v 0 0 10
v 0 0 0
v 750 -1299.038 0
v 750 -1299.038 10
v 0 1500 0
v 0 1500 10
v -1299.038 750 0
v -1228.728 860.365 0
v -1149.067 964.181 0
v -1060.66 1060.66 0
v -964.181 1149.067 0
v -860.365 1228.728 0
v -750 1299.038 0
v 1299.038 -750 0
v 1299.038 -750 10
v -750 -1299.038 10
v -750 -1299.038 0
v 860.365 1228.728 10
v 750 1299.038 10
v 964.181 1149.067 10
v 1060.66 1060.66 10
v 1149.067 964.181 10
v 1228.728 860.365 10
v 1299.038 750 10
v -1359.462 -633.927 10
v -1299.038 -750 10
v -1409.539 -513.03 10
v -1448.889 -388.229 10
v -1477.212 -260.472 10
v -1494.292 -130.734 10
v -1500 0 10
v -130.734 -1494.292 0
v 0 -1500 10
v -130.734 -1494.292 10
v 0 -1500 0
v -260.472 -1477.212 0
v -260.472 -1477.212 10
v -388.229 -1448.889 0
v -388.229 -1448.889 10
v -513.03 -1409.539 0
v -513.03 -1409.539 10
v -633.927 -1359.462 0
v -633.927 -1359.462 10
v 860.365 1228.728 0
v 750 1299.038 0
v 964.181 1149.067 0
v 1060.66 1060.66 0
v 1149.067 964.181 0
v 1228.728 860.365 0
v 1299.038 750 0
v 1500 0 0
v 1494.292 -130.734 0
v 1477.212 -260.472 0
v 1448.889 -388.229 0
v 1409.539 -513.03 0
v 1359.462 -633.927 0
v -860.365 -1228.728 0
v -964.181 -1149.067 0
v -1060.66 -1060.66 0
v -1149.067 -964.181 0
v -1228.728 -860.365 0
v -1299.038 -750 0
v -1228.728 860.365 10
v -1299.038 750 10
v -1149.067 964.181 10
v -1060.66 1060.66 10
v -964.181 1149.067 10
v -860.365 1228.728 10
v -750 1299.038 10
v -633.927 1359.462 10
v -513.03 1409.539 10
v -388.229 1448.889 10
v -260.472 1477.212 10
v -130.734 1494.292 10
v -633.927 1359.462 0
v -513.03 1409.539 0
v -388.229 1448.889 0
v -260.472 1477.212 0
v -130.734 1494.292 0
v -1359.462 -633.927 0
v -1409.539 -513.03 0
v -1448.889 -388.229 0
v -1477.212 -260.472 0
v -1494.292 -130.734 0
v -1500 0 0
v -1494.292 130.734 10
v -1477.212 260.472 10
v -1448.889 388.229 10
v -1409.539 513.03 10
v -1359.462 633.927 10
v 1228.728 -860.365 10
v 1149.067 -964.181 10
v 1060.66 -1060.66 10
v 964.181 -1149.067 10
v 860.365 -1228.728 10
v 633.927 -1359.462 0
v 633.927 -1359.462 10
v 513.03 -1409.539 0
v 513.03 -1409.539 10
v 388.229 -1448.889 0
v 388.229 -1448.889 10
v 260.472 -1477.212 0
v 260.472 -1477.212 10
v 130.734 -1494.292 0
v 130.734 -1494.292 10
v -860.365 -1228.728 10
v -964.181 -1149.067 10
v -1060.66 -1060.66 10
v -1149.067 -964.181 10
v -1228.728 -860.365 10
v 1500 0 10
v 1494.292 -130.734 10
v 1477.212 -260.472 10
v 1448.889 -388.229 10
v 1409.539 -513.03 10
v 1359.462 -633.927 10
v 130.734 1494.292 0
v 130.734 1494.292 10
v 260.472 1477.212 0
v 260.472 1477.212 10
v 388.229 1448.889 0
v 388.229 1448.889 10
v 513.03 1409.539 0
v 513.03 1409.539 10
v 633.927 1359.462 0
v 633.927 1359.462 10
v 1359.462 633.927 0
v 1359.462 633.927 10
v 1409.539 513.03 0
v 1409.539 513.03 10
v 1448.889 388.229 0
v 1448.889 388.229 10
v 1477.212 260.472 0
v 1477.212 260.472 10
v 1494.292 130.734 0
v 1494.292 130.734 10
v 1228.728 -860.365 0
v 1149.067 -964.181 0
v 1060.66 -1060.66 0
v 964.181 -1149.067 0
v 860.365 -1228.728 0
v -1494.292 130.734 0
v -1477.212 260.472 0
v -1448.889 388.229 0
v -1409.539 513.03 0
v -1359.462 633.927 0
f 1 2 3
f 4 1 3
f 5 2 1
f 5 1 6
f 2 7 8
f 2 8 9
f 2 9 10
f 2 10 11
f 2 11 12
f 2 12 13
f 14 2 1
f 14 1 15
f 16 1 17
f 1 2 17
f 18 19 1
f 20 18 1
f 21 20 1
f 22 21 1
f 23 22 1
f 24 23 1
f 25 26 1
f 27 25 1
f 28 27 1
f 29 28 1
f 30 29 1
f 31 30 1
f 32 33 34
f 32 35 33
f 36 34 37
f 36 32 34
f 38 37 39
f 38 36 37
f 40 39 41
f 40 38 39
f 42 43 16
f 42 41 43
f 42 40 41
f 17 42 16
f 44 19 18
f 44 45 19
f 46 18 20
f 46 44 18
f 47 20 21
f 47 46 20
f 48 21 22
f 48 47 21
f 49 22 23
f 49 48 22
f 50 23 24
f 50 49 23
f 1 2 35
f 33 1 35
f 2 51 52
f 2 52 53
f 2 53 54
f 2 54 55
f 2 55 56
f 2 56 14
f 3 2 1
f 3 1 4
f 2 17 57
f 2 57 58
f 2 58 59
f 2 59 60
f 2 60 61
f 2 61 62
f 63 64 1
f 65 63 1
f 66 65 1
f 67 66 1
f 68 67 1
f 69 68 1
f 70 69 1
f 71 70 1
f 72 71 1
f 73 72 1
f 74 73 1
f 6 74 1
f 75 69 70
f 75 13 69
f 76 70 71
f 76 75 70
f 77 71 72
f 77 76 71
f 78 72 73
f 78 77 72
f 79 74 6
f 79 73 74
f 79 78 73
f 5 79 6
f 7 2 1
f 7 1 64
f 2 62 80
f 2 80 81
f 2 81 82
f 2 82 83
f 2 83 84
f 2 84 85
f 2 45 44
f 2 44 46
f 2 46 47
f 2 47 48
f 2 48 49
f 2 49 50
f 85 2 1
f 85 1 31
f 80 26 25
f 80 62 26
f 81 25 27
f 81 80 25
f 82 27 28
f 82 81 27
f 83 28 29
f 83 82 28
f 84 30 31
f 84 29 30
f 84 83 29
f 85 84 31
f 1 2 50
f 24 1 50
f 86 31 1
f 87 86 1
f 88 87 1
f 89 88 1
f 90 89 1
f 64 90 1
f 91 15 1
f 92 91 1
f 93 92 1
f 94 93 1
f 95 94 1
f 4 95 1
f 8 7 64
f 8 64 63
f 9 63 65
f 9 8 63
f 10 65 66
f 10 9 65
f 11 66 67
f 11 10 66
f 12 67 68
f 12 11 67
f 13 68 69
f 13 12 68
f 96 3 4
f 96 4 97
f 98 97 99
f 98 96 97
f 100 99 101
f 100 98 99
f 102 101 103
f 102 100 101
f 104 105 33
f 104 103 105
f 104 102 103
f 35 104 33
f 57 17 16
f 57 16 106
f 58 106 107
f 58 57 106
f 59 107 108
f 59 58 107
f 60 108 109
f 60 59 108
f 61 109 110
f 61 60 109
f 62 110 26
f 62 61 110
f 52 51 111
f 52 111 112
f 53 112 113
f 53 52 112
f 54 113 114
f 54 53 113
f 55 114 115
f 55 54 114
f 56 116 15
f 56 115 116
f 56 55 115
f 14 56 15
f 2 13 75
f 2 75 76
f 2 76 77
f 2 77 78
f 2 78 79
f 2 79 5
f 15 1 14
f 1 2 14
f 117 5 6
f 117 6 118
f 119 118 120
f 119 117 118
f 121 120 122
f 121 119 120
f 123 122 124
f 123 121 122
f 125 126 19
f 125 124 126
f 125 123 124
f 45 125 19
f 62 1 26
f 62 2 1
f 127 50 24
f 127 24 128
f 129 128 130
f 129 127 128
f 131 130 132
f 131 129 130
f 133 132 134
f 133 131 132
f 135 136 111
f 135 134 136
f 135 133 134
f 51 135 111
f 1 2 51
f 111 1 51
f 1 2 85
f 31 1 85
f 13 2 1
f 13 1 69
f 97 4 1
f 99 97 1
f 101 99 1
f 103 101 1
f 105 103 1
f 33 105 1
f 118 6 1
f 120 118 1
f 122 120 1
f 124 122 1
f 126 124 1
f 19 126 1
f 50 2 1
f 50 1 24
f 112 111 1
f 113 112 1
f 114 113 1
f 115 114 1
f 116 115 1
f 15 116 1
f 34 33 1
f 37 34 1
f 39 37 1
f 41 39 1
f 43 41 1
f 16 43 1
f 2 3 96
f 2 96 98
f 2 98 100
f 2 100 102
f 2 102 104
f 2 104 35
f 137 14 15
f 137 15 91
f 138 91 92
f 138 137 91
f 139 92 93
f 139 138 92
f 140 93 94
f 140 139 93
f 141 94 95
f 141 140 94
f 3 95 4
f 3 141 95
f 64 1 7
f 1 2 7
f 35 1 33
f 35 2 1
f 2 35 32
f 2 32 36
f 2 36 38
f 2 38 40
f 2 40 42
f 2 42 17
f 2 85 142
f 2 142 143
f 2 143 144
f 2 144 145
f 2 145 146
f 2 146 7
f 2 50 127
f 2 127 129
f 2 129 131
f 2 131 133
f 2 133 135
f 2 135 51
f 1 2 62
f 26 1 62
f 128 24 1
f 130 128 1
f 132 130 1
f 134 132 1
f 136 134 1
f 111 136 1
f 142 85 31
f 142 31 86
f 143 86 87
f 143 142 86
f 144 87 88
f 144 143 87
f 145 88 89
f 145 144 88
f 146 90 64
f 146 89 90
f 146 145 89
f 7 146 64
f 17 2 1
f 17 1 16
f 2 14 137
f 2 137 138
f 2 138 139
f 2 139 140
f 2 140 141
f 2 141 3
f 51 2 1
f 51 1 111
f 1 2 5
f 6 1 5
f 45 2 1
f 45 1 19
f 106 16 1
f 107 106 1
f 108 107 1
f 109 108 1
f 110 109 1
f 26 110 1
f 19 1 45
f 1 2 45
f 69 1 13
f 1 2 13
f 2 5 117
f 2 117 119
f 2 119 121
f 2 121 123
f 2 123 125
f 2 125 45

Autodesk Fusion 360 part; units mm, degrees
sketch "Schizzo1" plane through (0, 0, 0) normal (0, 0, 1) x (1, 0, 0)
  circle A0 centre (0, 0) radius 1500
  line L0 (0, 0) -> (0, 1500)
  line L1 (0, 0) -> (-750, 1299.0381)
  line L2 (0, 0) -> (-1299.0381, 750)
  line L3 (0, 0) -> (-1500, 0)
  line L4 (0, 0) -> (-1299.0381, -750)
  line L5 (0, 0) -> (-750, -1299.0381)
  line L6 (0, 0) -> (0, -1500)
  line L7 (0, 0) -> (750, -1299.0381)
  line L8 (0, 0) -> (1299.0381, -750)
  line L9 (0, 0) -> (1500, 0)
  line L10 (0, 0) -> (1299.0381, 750)
  line L11 (0, 0) -> (750, 1299.0381)
  dimension "d1" = 3000
  dimension "d3" = 360
extrude "Estrusione1" add sketch "Schizzo1" along normal blind 10 contours A0 L0 L11 makes body 1
pattern_circular "Serie C1" count 12 over 360 about axis through (0, 0, 1.75) along (0, 0, 1) of bodies 1 makes body 2 at (-441.3417, 894.9525, 0) makes body 3 at (-829.6894, 554.3807, 0) makes body 4 at (-995.7224, 65.2631, 0) makes body 5 at (-894.9525, -441.3417, 0) makes body 6 at (-554.3807, -829.6894, 0) makes body 7 at (-65.2631, -995.7224, 0) makes body 8 at (441.3417, -894.9525, 0) makes body 9 at (829.6894, -554.3807, 0) makes body 10 at (995.7224, -65.2631, 0) makes body 11 at (894.9525, 441.3417, 0) makes body 12 at (554.3807, 829.6894, 0)
sketch "Schizzo2" plane through (0, 0, 10) normal (0, 0, 1) x (-1, 0, 0)
  line L0 (0, 0) -> (0, -1500)
  arc A0 (0, -1500) -> (750, -1299.0381) centre (0, 0) ccw
  line L1 (750, -1299.0381) -> (0, 0)
  line L2 (388.2286, -1448.8887) -> (0, 0) construction
  line L3 (205.786, -1057.7817) -> (350.6749, -1018.9588)
  line L4 (350.6749, -1018.9588) -> (311.8521, -874.07)
  line L5 (311.8521, -874.07) -> (166.9632, -912.8928)
  line L6 (166.9632, -912.8928) -> (205.786, -1057.7817)
  line L7 (205.786, -1057.7817) -> (311.8521, -874.07) construction
  line L8 (350.6749, -1018.9588) -> (166.9632, -912.8928) construction
  line L9 (874.07, 311.8521) -> (912.8928, 166.9632)
  line L10 (1018.9588, 350.6749) -> (874.07, 311.8521)
  line L11 (1057.7817, 205.786) -> (1018.9588, 350.6749)
  line L12 (912.8928, 166.9632) -> (1057.7817, 205.786)
  line L13 (-311.8521, 874.07) -> (-166.9632, 912.8928)
  line L14 (-350.6749, 1018.9588) -> (-311.8521, 874.07)
  line L15 (-205.786, 1057.7817) -> (-350.6749, 1018.9588)
  line L16 (-166.9632, 912.8928) -> (-205.786, 1057.7817)
  line L17 (-874.07, -311.8521) -> (-912.8928, -166.9632)
  line L18 (-1018.9588, -350.6749) -> (-874.07, -311.8521)
  line L19 (-1057.7817, -205.786) -> (-1018.9588, -350.6749)
  line L20 (-912.8928, -166.9632) -> (-1057.7817, -205.786)
  point P0 (258.819, -965.9258)
  dimension "d8" = 500
  dimension "d9" = 150
  dimension "d10" = 150
  dimension "d12" = 360
component "Component" placed x (1, 0, 0) y (0, 1, 0) z (0, 0, 1) at (0, 0, 0)
